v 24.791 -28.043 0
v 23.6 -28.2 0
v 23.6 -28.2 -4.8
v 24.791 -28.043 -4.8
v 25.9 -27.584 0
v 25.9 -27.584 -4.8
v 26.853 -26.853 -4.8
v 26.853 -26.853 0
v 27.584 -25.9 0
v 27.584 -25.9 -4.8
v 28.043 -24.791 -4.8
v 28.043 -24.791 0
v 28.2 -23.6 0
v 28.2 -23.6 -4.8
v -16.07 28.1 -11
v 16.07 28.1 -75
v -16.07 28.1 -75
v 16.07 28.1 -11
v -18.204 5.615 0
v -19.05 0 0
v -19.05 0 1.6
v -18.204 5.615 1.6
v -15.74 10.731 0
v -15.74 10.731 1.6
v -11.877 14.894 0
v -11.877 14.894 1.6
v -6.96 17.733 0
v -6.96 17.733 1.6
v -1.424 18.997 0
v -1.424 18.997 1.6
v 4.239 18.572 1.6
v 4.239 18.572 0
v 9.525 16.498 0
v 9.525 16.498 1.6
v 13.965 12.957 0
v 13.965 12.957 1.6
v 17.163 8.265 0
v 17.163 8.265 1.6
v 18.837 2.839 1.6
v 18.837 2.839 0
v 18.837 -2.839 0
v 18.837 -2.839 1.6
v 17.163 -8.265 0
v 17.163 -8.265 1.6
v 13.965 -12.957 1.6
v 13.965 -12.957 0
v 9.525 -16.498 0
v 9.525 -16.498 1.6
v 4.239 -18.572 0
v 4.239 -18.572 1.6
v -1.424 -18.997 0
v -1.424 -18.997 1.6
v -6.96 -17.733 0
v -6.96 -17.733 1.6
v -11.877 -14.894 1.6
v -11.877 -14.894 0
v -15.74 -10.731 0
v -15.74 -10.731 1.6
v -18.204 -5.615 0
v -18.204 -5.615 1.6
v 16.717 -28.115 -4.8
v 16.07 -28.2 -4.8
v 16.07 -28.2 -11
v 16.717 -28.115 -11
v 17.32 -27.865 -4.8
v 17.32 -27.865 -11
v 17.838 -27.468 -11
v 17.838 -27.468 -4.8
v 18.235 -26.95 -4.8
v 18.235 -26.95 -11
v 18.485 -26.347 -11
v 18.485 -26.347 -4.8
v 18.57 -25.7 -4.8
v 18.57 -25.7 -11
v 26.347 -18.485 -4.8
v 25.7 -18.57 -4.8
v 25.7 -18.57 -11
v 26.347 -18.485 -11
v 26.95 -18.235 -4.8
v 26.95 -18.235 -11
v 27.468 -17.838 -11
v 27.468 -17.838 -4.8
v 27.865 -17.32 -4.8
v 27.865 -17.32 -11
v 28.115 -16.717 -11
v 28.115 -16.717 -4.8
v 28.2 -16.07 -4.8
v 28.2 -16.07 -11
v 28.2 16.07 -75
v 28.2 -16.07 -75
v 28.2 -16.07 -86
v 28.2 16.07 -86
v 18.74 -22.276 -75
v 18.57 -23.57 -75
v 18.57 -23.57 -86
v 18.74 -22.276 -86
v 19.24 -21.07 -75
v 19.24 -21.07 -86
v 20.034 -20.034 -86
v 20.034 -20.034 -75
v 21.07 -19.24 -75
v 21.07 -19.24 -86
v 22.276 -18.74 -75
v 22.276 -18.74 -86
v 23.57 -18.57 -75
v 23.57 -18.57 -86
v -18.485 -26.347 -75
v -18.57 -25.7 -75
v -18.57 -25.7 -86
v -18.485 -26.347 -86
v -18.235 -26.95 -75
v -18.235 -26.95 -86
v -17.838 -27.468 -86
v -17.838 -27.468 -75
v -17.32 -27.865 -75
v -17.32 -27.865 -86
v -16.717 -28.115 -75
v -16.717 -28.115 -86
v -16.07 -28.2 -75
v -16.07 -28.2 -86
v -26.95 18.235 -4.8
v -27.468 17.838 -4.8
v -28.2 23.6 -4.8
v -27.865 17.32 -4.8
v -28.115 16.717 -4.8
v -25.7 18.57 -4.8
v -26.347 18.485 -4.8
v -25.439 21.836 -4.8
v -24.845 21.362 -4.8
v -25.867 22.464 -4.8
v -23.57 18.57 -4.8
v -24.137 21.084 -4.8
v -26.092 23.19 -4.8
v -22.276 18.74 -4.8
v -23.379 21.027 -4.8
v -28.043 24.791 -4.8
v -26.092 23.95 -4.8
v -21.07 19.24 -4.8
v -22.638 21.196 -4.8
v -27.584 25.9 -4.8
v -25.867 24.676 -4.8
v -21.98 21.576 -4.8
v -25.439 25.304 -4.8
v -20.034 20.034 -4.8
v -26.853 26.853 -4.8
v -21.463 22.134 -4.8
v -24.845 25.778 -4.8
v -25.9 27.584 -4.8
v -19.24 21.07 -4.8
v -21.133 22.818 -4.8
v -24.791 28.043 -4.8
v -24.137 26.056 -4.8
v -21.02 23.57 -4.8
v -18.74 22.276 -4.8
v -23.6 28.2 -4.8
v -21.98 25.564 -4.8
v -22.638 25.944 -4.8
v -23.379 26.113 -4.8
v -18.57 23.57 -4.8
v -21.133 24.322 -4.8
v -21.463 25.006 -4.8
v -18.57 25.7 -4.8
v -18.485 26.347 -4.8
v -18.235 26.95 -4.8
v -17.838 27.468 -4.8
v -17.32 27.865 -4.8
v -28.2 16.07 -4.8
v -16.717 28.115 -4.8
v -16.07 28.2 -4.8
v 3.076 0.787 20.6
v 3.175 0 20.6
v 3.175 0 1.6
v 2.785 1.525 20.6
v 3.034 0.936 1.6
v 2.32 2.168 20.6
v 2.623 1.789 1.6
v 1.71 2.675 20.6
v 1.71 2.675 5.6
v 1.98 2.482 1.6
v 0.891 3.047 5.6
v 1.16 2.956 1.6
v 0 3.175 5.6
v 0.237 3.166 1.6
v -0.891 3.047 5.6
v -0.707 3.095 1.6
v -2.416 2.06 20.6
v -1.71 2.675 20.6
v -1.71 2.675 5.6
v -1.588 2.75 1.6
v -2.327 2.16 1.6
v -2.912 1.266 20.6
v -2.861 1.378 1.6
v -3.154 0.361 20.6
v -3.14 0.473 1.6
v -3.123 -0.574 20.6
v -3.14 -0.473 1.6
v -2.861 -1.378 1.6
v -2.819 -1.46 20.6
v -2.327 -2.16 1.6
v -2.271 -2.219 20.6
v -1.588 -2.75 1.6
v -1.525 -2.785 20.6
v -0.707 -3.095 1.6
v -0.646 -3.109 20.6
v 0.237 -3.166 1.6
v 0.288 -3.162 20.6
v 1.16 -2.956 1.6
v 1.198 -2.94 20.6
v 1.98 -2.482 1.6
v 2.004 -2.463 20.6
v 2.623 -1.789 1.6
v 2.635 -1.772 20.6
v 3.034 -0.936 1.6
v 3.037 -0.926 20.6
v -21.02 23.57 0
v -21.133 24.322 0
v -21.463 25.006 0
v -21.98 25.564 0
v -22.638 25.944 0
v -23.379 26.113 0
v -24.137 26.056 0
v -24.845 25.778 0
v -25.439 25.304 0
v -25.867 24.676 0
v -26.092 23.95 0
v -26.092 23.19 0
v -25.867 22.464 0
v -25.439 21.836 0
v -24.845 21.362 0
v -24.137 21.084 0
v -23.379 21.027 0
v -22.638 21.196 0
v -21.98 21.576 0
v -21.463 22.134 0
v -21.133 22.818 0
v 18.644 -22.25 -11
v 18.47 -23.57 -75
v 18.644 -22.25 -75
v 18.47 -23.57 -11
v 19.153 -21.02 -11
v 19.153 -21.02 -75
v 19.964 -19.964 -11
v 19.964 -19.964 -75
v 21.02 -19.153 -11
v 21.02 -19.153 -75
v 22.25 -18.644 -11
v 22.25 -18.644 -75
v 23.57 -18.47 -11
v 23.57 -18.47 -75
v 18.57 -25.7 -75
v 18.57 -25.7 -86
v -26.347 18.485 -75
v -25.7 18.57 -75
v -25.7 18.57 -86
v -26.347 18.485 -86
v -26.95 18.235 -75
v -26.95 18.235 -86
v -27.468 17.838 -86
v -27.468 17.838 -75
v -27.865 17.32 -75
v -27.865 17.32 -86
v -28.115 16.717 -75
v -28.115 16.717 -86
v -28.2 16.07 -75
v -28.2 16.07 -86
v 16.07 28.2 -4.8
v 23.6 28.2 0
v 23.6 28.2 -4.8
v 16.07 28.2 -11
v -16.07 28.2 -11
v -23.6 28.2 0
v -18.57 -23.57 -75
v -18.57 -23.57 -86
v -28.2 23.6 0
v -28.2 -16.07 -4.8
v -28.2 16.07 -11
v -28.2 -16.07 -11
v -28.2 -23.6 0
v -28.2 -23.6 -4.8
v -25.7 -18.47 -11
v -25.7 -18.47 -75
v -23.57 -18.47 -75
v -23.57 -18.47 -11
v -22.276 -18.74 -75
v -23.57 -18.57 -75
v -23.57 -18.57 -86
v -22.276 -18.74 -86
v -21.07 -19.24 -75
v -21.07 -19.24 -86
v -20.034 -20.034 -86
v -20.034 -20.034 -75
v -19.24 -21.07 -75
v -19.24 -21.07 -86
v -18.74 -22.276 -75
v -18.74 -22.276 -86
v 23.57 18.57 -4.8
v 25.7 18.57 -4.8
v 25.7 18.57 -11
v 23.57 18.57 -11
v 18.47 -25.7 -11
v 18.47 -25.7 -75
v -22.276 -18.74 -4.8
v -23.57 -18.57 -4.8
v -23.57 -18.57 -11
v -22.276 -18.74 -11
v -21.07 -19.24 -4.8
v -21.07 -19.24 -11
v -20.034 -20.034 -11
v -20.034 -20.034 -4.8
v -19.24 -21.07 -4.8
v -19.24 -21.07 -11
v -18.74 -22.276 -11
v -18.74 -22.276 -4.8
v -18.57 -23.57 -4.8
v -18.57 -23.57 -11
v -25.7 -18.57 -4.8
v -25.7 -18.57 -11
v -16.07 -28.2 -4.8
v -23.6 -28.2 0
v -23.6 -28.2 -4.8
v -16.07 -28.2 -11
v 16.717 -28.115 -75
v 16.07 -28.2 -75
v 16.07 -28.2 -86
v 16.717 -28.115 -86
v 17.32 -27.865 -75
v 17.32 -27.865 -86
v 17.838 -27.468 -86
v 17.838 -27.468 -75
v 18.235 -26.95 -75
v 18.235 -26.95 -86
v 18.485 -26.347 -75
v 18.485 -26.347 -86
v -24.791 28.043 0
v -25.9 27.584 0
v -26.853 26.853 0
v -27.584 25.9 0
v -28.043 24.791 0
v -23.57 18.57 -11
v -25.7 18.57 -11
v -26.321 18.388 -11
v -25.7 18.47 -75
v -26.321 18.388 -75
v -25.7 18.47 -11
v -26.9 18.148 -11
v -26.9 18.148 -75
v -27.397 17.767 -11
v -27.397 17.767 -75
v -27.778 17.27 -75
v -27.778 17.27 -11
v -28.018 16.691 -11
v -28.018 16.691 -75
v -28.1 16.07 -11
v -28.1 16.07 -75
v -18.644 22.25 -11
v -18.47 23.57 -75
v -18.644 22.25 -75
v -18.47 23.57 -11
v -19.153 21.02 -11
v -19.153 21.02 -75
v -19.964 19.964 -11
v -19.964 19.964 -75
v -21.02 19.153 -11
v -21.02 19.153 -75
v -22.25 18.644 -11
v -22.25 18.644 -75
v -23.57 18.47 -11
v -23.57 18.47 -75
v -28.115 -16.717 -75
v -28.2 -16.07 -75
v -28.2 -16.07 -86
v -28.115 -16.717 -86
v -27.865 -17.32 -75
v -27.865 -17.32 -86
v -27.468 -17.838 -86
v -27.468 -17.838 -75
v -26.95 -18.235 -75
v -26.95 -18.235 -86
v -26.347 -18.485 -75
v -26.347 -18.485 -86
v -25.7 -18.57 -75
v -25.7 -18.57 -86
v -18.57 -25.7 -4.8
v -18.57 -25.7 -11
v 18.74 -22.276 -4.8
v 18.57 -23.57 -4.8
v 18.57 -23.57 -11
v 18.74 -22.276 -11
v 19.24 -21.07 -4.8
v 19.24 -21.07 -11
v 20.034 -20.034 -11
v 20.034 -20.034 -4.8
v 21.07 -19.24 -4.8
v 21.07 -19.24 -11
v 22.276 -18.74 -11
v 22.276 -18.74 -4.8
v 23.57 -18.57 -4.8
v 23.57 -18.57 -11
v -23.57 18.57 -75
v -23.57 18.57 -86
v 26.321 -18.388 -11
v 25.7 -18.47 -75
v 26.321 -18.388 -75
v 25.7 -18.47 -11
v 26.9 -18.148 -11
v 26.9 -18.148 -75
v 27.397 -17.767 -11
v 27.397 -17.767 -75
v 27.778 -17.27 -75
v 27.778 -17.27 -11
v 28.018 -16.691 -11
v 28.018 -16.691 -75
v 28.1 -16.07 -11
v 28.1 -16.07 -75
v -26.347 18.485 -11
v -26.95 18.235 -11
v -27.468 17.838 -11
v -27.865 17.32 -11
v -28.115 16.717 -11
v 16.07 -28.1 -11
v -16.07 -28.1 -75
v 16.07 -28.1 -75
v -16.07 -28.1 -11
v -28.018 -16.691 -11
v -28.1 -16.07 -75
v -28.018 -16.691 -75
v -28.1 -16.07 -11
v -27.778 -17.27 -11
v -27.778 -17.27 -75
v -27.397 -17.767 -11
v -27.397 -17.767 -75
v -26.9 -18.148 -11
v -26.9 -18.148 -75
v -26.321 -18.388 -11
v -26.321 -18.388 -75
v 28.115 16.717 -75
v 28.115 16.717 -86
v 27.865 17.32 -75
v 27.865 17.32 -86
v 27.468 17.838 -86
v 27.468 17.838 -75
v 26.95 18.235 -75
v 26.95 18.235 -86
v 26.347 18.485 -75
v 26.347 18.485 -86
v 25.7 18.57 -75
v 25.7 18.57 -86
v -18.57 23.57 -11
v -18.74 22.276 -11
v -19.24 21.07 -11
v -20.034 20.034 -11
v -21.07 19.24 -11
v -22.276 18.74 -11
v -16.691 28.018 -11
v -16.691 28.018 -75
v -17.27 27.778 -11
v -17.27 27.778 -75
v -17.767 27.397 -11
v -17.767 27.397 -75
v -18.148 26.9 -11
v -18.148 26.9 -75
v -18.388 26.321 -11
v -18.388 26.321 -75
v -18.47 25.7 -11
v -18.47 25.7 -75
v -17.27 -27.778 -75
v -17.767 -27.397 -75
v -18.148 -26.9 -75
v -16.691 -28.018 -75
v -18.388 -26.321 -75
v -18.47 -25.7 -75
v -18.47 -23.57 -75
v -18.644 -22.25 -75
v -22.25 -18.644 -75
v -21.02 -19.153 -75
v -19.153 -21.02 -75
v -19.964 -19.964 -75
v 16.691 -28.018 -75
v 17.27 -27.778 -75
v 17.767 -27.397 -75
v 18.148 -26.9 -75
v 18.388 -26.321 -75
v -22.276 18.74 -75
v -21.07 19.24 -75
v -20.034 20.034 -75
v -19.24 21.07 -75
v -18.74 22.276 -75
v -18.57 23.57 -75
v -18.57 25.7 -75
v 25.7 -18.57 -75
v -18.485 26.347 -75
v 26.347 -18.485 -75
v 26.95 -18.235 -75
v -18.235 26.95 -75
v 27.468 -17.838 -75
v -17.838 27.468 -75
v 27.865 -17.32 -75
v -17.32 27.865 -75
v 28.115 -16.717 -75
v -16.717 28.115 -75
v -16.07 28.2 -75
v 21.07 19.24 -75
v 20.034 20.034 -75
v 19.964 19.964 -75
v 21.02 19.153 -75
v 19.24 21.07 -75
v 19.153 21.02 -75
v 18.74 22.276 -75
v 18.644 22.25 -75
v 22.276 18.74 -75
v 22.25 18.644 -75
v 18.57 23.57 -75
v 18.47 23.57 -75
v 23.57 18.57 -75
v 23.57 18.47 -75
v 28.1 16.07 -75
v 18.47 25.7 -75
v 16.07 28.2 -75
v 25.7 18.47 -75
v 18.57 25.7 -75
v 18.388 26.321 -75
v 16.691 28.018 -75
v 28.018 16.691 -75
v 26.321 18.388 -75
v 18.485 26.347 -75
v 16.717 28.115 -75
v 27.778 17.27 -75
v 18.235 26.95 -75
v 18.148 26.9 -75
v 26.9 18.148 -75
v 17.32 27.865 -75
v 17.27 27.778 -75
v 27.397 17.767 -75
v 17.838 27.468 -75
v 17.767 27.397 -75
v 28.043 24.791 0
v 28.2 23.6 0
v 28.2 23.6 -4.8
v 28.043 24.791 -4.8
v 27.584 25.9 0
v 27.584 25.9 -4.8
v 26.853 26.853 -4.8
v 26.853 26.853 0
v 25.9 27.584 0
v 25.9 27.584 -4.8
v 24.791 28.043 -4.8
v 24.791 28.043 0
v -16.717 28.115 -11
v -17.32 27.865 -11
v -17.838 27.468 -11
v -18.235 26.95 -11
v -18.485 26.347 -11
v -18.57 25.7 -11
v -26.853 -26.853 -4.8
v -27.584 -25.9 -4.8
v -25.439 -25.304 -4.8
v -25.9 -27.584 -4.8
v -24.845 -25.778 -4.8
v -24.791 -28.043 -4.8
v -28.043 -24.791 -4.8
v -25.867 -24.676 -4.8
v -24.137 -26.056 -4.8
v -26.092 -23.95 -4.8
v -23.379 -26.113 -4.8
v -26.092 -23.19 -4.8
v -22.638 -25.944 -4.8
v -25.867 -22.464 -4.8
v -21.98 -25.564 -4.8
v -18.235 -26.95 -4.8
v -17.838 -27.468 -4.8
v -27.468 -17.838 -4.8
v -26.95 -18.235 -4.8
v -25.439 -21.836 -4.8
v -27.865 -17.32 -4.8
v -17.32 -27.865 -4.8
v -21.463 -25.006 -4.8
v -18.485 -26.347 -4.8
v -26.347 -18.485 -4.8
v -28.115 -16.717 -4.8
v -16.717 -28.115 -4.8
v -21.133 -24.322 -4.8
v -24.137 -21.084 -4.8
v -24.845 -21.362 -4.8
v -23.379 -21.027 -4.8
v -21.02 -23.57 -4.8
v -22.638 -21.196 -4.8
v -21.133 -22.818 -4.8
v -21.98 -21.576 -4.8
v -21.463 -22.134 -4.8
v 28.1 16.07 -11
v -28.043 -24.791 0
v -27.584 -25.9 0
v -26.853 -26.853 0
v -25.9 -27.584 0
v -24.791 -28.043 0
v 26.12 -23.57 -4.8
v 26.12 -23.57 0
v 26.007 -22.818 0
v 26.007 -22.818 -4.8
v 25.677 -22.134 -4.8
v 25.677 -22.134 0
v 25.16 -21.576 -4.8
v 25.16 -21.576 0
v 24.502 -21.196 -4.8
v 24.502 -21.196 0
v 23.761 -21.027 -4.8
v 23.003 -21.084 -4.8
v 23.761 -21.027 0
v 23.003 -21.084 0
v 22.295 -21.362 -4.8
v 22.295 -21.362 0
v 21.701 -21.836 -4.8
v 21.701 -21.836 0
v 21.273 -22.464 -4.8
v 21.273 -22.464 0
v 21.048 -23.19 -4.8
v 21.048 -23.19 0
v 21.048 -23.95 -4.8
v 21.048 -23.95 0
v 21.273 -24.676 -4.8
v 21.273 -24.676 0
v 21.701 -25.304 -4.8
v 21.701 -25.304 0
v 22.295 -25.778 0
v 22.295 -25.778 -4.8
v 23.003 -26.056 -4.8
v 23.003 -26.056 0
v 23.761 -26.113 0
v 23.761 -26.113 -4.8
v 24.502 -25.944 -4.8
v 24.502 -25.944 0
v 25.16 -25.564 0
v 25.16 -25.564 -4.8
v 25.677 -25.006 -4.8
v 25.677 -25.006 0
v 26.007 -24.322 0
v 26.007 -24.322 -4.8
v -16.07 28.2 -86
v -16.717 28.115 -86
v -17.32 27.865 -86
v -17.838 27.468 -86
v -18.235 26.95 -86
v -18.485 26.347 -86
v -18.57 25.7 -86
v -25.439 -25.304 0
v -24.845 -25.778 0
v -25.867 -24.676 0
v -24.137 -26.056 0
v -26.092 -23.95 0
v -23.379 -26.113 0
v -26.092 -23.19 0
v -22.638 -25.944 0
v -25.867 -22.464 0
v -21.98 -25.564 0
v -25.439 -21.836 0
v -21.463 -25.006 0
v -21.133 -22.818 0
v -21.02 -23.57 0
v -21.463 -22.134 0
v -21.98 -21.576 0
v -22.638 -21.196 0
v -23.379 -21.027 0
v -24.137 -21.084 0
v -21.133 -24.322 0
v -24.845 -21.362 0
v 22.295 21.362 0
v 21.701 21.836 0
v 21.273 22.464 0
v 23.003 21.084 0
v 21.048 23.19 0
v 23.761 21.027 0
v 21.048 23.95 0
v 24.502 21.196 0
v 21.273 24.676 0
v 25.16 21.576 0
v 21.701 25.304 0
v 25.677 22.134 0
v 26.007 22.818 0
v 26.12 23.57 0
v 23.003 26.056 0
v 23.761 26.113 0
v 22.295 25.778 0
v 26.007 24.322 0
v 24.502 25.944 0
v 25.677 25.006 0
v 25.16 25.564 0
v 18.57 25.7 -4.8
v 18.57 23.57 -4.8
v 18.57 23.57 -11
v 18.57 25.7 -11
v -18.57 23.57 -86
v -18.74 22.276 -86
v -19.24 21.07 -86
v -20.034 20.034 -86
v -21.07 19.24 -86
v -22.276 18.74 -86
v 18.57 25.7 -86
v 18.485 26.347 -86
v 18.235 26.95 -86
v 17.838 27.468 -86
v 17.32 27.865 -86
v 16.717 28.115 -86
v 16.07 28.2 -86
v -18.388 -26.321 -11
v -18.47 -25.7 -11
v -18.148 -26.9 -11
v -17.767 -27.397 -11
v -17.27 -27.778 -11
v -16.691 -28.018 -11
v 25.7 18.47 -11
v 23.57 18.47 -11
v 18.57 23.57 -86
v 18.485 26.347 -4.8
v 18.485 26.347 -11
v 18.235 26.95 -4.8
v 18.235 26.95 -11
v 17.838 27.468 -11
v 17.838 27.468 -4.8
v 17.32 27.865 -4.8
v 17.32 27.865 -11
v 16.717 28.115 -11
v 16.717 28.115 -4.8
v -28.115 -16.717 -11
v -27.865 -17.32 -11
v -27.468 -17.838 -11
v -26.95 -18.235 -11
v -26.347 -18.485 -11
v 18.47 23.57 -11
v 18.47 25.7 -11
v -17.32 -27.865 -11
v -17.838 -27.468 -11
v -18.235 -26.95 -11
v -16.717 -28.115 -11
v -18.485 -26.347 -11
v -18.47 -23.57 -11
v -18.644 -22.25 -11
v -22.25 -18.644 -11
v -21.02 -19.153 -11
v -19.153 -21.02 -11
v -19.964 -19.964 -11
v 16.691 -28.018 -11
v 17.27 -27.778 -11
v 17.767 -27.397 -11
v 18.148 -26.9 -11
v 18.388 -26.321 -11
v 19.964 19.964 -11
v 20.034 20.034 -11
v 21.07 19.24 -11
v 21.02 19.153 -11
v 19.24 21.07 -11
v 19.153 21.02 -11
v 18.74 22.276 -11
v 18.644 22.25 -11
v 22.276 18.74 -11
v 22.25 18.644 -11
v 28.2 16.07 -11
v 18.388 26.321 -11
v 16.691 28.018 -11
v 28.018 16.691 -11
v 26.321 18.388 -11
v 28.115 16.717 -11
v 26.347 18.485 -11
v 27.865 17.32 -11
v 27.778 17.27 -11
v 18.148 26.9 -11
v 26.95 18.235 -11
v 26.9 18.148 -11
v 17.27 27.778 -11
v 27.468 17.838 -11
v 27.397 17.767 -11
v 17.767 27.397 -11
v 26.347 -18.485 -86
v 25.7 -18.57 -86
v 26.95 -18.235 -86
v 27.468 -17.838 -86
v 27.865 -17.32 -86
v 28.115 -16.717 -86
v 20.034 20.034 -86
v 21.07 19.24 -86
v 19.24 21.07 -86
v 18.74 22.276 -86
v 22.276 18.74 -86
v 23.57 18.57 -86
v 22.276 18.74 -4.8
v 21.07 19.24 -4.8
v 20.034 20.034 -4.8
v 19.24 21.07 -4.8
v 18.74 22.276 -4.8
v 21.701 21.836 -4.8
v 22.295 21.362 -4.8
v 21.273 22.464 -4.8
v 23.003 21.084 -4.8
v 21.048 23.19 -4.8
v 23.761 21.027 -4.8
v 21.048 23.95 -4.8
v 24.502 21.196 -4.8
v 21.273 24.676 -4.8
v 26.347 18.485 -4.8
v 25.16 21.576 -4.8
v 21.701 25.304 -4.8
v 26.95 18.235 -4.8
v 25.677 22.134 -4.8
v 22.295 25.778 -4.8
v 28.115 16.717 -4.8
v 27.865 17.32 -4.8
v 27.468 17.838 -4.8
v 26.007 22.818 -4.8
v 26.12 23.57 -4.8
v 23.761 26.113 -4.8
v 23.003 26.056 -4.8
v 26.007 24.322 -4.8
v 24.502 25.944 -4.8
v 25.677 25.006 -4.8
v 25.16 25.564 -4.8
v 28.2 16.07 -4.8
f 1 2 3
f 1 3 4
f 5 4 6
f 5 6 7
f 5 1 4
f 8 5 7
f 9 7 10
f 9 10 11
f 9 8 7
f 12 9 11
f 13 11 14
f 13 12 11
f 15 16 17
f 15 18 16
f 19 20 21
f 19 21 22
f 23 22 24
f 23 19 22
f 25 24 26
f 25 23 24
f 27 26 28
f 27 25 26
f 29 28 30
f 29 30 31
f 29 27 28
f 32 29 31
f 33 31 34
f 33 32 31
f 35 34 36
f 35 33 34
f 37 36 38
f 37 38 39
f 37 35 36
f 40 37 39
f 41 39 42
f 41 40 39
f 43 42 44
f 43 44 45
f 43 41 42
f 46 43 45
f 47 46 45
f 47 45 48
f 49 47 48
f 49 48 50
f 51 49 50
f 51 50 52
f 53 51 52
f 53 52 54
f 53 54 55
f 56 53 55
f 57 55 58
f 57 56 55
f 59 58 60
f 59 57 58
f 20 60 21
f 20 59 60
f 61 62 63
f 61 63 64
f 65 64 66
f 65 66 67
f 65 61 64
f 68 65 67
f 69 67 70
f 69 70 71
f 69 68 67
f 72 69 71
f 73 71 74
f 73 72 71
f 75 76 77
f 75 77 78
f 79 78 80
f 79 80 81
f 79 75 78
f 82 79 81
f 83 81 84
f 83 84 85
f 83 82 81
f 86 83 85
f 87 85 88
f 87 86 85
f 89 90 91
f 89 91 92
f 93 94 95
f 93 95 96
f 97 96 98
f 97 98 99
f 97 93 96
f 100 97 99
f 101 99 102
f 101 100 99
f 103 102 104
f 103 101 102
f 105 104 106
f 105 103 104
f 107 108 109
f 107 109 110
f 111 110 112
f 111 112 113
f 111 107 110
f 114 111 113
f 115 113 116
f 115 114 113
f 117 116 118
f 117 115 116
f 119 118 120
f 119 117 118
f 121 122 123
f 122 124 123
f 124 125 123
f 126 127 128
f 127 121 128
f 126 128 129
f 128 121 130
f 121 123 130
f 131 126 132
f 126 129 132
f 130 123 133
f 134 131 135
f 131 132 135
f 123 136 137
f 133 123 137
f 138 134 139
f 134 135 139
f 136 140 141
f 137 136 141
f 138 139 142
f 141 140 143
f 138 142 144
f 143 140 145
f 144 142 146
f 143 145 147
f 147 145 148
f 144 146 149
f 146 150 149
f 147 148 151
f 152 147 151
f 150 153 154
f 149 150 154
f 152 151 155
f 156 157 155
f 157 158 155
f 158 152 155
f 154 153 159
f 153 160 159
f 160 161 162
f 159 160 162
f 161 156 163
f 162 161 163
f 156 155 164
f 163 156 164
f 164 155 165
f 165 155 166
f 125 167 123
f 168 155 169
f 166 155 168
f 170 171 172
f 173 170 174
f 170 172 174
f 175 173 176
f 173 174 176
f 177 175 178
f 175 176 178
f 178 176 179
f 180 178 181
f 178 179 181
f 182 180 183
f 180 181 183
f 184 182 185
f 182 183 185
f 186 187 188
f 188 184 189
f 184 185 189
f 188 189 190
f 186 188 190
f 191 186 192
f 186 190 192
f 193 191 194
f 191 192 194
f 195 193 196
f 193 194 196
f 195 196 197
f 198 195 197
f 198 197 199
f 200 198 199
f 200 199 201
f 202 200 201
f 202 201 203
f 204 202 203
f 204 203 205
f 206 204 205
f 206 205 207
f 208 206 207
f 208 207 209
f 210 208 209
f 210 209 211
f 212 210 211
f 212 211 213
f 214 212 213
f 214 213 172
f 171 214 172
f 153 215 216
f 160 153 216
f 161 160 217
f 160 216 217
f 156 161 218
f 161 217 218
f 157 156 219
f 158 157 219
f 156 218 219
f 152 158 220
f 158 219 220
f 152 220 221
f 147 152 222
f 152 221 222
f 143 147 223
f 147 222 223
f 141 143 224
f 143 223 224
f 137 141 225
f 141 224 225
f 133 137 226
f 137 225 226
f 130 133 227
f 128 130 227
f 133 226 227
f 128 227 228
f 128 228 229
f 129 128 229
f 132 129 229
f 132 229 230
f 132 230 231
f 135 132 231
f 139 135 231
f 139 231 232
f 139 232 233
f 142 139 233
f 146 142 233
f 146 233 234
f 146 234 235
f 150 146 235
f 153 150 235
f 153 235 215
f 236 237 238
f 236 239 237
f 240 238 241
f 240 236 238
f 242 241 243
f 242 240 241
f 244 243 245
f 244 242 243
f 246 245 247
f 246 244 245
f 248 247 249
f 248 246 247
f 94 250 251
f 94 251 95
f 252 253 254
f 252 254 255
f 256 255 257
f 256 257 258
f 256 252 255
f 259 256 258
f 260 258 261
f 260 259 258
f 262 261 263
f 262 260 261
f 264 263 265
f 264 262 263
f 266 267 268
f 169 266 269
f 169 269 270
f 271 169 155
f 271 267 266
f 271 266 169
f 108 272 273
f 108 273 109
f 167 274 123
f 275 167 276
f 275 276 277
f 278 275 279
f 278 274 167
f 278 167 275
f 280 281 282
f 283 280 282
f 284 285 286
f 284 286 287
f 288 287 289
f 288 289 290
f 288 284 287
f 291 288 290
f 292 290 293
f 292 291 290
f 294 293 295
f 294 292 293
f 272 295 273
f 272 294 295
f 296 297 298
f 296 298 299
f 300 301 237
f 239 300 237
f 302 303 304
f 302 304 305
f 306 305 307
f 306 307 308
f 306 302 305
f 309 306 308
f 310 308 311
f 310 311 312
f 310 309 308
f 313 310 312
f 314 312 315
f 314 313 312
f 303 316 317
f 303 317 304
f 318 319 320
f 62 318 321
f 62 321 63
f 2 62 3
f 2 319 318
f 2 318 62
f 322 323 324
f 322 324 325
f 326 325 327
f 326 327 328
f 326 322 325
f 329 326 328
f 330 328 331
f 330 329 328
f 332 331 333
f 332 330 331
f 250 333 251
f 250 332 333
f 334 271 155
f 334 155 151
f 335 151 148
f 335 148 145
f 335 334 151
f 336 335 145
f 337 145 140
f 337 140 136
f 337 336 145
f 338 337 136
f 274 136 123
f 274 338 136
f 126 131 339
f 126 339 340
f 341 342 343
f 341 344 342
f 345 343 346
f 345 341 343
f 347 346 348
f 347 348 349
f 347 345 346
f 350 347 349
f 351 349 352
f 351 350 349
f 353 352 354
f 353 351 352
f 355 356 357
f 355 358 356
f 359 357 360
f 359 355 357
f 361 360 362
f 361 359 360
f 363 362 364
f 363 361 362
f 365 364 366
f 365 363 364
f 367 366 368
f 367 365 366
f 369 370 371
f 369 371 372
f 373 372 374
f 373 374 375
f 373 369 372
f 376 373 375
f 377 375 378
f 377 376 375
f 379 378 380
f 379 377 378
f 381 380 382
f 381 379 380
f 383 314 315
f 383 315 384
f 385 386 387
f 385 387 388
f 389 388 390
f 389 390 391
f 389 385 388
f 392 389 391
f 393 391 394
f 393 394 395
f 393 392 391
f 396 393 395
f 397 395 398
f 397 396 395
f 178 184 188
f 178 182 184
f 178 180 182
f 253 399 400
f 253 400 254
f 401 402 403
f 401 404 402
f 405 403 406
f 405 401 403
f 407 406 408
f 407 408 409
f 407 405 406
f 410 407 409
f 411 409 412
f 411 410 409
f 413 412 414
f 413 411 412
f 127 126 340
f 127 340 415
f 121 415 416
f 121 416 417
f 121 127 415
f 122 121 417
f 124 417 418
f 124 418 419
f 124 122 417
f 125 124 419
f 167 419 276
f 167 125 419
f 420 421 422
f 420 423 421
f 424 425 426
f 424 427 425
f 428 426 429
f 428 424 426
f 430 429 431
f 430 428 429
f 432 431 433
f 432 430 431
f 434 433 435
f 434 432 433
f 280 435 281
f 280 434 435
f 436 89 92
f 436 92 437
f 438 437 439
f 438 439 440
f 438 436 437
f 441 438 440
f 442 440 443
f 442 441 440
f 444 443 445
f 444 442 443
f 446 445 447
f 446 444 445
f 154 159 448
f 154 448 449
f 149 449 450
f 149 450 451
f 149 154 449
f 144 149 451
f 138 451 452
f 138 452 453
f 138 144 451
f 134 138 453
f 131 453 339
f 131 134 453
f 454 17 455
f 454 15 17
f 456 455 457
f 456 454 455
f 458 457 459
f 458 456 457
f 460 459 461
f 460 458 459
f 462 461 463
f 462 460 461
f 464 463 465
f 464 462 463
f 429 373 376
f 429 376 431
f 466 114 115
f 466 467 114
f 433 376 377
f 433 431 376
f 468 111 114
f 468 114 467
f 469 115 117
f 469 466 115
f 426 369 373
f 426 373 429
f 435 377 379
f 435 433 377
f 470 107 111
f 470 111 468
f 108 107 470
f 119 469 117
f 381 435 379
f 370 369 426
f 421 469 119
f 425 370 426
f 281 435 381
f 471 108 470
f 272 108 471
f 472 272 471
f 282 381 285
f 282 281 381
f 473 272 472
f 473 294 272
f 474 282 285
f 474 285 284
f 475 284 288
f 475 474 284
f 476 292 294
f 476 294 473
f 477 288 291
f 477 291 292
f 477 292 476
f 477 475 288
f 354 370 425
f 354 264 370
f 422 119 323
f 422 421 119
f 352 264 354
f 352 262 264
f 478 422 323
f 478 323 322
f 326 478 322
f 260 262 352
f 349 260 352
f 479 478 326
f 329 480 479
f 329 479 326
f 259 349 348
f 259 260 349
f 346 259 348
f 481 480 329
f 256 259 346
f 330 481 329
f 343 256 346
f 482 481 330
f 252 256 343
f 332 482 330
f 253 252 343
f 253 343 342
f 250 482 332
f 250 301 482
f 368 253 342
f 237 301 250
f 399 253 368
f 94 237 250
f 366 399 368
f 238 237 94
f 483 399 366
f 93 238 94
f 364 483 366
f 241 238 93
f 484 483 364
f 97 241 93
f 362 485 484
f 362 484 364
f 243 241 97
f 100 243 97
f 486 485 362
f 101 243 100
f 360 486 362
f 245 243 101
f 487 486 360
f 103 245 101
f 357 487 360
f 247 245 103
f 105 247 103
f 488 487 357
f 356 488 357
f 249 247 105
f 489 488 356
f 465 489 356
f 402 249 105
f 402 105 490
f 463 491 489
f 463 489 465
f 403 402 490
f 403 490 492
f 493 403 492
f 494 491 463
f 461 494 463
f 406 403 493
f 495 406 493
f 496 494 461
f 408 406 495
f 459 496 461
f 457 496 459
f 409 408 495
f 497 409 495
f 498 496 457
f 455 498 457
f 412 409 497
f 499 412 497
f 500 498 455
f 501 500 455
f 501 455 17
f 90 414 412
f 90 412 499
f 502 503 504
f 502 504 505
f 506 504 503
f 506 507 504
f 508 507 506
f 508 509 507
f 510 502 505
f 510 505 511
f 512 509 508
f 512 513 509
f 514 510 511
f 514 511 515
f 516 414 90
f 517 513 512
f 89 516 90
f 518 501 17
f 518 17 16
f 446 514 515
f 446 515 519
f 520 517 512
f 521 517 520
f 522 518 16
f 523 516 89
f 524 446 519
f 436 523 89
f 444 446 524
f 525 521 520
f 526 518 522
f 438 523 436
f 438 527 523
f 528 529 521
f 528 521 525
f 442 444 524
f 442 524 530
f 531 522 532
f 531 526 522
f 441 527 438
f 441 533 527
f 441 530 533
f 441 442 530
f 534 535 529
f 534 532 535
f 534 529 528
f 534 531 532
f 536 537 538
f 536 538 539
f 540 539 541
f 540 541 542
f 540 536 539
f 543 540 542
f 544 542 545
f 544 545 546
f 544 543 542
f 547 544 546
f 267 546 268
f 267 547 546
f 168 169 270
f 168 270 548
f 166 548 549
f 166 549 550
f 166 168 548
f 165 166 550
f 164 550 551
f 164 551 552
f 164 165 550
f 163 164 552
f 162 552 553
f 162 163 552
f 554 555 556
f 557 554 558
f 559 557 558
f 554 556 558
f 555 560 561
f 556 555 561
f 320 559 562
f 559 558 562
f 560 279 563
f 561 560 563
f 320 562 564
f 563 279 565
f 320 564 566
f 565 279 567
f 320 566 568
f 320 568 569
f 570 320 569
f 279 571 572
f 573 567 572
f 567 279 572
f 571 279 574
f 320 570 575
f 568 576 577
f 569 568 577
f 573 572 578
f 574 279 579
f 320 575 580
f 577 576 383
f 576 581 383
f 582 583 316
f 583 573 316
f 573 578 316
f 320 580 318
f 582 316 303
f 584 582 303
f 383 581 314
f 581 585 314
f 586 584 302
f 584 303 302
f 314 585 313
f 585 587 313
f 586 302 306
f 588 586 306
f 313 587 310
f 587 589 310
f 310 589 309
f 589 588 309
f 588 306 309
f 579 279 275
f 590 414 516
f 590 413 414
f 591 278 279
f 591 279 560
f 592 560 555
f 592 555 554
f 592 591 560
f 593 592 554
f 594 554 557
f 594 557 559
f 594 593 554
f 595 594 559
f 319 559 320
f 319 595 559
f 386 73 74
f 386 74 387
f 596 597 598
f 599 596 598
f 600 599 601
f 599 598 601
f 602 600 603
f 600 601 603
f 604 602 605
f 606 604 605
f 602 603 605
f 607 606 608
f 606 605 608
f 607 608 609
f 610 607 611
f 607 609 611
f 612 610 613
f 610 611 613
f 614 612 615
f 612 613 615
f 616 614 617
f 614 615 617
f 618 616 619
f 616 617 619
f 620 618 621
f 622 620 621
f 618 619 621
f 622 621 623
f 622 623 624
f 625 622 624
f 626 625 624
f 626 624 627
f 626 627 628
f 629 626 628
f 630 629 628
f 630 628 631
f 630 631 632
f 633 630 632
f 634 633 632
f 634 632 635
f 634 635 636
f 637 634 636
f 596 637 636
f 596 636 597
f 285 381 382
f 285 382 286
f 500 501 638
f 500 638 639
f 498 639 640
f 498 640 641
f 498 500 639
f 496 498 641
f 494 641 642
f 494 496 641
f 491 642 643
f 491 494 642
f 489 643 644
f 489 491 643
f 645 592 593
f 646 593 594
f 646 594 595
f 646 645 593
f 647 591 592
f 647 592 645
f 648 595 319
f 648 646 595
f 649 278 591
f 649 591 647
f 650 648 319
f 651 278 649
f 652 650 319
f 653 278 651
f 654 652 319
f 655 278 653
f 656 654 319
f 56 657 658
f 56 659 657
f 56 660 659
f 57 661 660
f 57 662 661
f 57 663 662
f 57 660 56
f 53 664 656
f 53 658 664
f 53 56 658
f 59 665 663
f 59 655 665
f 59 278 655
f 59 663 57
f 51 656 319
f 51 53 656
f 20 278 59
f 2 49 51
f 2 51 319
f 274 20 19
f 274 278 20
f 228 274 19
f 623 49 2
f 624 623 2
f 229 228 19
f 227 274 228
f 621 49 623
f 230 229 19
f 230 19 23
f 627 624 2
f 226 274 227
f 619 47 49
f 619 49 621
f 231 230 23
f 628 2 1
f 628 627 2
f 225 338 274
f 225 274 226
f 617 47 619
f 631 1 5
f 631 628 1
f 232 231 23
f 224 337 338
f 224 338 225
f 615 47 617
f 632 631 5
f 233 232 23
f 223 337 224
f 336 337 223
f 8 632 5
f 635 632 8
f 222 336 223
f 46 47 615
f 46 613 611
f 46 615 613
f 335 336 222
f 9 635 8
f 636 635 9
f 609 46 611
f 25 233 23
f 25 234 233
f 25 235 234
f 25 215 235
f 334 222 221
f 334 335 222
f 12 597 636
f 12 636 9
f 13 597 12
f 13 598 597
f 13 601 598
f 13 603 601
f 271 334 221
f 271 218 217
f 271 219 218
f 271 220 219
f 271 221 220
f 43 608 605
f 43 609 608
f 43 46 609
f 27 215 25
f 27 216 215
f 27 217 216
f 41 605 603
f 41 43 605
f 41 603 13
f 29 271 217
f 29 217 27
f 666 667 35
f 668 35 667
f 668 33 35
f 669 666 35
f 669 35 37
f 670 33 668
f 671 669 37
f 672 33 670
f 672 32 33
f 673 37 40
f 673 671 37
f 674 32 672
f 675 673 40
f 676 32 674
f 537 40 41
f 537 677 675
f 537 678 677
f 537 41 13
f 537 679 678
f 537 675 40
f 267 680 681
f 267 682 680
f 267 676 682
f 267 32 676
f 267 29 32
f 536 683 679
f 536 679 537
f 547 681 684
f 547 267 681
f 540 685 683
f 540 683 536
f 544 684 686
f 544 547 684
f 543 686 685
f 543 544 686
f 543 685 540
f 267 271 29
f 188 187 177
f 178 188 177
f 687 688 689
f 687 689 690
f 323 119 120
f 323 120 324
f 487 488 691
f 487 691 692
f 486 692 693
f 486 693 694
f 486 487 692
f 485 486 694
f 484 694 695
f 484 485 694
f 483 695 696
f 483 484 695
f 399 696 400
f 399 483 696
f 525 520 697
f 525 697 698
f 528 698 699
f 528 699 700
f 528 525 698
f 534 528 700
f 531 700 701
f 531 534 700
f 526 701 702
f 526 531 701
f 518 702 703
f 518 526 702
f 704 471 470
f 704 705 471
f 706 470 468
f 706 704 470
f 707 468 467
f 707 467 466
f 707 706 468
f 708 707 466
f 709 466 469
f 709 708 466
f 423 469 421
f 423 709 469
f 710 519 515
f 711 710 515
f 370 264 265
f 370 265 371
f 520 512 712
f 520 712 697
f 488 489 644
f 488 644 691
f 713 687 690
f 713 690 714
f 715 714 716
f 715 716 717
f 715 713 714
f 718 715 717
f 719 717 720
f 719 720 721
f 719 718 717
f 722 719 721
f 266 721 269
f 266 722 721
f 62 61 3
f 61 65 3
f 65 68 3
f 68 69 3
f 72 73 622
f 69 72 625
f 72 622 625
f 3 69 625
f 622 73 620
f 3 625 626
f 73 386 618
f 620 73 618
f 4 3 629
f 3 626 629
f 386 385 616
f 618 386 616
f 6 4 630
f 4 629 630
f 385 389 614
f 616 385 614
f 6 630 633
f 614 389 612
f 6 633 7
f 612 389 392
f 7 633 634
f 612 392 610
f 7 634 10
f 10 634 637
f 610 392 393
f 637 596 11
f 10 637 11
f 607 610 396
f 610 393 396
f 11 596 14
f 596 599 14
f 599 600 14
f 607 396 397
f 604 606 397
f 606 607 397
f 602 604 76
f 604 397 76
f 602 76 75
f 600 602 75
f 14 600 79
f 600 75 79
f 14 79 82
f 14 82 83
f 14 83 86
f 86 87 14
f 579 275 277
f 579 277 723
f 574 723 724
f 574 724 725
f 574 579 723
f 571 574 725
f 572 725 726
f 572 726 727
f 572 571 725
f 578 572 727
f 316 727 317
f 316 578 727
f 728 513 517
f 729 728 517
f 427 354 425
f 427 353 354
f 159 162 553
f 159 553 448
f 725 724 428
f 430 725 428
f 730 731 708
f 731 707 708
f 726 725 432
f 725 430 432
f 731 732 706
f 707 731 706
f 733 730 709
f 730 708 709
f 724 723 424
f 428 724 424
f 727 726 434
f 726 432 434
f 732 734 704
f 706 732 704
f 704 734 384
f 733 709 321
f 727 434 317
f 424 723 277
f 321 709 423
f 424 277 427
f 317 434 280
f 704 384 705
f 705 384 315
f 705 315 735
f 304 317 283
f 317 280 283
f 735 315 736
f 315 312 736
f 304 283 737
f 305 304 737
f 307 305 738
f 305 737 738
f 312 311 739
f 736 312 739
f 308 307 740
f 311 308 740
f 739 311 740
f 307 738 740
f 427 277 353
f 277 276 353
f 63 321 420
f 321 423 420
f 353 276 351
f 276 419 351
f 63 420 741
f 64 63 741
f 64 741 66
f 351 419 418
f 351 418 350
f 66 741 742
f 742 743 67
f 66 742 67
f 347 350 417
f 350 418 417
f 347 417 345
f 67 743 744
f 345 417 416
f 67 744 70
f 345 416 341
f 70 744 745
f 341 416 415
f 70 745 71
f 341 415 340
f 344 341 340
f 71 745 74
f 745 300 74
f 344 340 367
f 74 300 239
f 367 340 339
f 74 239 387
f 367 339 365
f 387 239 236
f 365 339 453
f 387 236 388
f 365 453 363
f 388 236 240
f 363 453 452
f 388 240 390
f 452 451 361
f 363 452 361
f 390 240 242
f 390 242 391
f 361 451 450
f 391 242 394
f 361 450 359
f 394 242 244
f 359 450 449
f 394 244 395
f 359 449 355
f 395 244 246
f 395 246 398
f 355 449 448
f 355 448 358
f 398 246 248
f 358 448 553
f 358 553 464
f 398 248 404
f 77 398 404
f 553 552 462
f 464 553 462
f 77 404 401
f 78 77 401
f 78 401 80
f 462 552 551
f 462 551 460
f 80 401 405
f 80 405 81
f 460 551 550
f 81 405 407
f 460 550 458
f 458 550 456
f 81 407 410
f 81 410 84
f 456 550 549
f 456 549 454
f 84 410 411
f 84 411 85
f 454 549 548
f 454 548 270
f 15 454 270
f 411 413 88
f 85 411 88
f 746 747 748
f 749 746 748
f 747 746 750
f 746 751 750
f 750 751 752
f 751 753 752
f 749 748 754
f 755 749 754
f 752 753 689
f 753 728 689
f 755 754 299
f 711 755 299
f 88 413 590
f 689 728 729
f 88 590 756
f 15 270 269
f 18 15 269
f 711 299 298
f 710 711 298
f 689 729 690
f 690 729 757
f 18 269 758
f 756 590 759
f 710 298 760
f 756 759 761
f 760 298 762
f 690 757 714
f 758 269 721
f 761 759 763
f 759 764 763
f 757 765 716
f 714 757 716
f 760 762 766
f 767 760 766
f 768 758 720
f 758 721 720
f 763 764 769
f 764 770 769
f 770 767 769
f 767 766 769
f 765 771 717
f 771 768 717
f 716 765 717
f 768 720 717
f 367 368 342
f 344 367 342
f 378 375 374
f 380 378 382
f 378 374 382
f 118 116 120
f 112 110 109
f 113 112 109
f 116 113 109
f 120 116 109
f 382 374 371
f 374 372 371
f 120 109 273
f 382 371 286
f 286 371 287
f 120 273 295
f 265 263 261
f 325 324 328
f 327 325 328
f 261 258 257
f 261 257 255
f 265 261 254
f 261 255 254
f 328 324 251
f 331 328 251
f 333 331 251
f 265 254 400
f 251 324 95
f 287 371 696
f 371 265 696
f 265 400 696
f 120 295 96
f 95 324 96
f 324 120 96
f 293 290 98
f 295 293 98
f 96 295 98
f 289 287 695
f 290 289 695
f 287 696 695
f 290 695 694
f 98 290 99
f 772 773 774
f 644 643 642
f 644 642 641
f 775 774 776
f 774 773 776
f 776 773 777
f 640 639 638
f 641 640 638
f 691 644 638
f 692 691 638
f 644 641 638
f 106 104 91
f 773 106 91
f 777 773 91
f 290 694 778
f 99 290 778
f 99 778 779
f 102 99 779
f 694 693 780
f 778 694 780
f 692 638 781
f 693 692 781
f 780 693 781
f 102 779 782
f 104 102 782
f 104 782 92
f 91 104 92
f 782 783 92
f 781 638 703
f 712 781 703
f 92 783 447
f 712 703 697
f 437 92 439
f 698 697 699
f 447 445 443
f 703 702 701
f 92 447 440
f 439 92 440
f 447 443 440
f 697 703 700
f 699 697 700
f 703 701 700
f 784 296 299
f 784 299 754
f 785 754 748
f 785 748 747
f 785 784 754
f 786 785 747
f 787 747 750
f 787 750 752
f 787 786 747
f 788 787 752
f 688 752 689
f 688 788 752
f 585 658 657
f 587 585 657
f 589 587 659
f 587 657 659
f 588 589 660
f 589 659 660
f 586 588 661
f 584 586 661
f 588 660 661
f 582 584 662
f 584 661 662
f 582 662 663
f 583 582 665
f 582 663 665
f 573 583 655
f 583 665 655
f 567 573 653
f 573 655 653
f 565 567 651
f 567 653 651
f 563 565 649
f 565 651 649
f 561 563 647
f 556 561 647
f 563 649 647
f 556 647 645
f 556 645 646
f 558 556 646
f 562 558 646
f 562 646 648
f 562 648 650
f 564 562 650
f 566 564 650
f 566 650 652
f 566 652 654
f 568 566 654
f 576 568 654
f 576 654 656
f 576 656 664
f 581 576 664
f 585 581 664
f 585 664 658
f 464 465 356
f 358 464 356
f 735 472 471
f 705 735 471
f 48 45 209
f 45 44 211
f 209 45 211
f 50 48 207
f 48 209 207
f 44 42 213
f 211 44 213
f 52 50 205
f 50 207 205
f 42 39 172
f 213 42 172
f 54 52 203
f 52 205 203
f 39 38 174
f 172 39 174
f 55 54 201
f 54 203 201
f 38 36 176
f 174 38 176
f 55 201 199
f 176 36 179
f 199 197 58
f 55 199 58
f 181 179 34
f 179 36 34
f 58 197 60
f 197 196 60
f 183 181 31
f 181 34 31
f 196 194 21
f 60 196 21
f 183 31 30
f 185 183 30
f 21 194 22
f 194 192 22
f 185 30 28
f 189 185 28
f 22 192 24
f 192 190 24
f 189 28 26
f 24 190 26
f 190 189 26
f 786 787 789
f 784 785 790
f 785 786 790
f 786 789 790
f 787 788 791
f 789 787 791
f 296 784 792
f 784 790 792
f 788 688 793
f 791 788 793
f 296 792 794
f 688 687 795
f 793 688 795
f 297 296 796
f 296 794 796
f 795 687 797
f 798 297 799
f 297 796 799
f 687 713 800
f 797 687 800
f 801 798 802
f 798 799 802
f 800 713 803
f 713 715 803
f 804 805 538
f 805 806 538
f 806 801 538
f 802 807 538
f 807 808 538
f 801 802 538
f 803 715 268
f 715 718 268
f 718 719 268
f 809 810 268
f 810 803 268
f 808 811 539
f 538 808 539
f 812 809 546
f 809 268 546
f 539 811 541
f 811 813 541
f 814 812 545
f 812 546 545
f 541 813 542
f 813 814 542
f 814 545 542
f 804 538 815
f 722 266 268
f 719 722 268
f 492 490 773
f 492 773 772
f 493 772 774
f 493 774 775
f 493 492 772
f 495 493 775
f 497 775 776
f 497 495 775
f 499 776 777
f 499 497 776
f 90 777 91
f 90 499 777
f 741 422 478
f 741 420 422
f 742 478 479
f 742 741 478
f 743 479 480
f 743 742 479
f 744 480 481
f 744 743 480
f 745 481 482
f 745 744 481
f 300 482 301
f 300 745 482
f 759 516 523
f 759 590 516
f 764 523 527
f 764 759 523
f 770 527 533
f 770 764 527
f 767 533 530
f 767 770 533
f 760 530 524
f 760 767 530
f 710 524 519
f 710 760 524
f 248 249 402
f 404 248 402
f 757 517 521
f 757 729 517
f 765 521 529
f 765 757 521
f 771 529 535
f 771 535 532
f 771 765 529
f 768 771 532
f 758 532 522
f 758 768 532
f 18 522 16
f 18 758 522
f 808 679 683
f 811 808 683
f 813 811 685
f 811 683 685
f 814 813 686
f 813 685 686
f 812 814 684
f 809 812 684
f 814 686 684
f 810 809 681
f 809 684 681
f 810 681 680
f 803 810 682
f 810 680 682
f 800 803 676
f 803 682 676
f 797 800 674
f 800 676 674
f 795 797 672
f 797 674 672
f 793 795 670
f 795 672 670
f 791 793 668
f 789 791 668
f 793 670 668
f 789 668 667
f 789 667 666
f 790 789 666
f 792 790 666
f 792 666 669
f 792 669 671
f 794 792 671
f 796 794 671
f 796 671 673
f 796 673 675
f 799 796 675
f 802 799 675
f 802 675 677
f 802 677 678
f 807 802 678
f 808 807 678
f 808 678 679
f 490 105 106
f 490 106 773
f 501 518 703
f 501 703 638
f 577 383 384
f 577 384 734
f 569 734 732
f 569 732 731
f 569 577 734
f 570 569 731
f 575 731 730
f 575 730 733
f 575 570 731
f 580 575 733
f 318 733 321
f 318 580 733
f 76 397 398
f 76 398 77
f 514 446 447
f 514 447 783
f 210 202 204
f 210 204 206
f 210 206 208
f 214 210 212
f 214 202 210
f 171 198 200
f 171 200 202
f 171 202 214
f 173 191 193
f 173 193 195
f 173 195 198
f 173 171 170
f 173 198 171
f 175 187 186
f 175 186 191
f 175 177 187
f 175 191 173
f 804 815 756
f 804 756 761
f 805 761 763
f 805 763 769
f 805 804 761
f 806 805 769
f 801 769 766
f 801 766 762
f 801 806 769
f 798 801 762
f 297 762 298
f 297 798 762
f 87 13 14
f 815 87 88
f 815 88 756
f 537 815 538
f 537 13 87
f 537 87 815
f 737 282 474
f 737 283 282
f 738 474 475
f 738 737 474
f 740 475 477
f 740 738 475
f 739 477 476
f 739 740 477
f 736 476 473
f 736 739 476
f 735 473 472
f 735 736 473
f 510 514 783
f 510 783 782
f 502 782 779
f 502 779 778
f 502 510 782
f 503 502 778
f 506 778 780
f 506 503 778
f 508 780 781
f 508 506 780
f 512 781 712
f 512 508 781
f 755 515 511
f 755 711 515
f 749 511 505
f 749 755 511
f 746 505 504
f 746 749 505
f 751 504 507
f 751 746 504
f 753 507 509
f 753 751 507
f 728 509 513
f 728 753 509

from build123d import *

# Parameters (mm, degrees)
SKETCH1_R           = 3.175
BOSS_EXTRUDE1_DEPTH = 20.6
SKETCH2_R           = 19.05
BOSS_EXTRUDE2_DEPTH = 1.6
BOSS_EXTRUDE3_DEPTH = 4.8
BOSS_EXTRUDE4_DEPTH = 81.2
SKETCH7_W           = 3.420526276
SKETCH7_H           = 1.112659396
CUT_EXTRUDE5_DEPTH  = 15
CUT_EXTRUDE6_REACH  = 88
SKETCH8_R           = 2.55
CUT_EXTRUDE7_DEPTH  = 32


with BuildPart() as part:
    # Sketch1 → Boss-Extrude1 (new body)
    with BuildSketch(Plane.XY):
        Circle(SKETCH1_R)
    extrude(amount=BOSS_EXTRUDE1_DEPTH)

    # Sketch2 → Boss-Extrude2 (add)
    with BuildSketch(Plane(origin=(0, 0, 0), x_dir=(-1, 0, 0), z_dir=(0, 0, -1))):
        Circle(SKETCH2_R)
    extrude(amount=-BOSS_EXTRUDE2_DEPTH)

    # Sketch3 → Boss-Extrude3 (add)
    with BuildSketch(Plane(origin=(0, 0, 0), x_dir=(-1, 0, 0), z_dir=(0, 0, -1))):
        with BuildLine():
            Line((23.6, -28.2), (-23.6, -28.2))
            ThreePointArc((-23.6, -28.2), (-26.852691193, -26.852691193), (-28.2, -23.6))
            Line((-28.2, -23.6), (-28.2, 23.6))
            ThreePointArc((-28.2, 23.6), (-26.852691193, 26.852691193), (-23.6, 28.2))
            Line((-23.6, 28.2), (23.6, 28.2))
            ThreePointArc((23.6, 28.2), (26.852691193, 26.852691193), (28.2, 23.6))
            Line((28.2, 23.6), (28.2, -23.6))
            ThreePointArc((28.2, -23.6), (26.852691193, -26.852691193), (23.6, -28.2))
        make_face()
    extrude(amount=BOSS_EXTRUDE3_DEPTH)

    # Sketch4 → Boss-Extrude4 (add)
    with BuildSketch(Plane(origin=(0, 0, -4.8), x_dir=(-1, 0, 0), z_dir=(0, 0, -1))):
        with BuildLine():
            Line((-18.57, 23.57), (-18.57, 25.7))
            ThreePointArc((-18.57, 25.7), (-17.837766953, 27.467766953), (-16.07, 28.2))
            Line((-16.07, 28.2), (16.07, 28.2))
            ThreePointArc((16.07, 28.2), (17.837766953, 27.467766953), (18.57, 25.7))
            Line((18.57, 25.7), (18.57, 23.57))
            ThreePointArc((18.57, 23.57), (20.034466094, 20.034466094), (23.57, 18.57))
            Line((23.57, 18.57), (25.7, 18.57))
            ThreePointArc((25.7, 18.57), (27.467766953, 17.837766953), (28.2, 16.07))
            Line((28.2, 16.07), (28.2, -16.07))
            ThreePointArc((28.2, -16.07), (27.467766953, -17.837766953), (25.7, -18.57))
            Line((25.7, -18.57), (23.57, -18.57))
            ThreePointArc((23.57, -18.57), (20.034466094, -20.034466094), (18.57, -23.57))
            Line((18.57, -23.57), (18.57, -25.7))
            ThreePointArc((18.57, -25.7), (17.837766953, -27.467766953), (16.07, -28.2))
            Line((16.07, -28.2), (-16.07, -28.2))
            ThreePointArc((-16.07, -28.2), (-17.837766953, -27.467766953), (-18.57, -25.7))
            Line((-18.57, -25.7), (-18.57, -23.57))
            ThreePointArc((-18.57, -23.57), (-20.034466094, -20.034466094), (-23.57, -18.57))
            Line((-23.57, -18.57), (-25.7, -18.57))
            ThreePointArc((-25.7, -18.57), (-27.467766953, -17.837766953), (-28.2, -16.07))
            Line((-28.2, -16.07), (-28.2, 16.07))
            ThreePointArc((-28.2, 16.07), (-27.467766953, 17.837766953), (-25.7, 18.57))
            Line((-25.7, 18.57), (-23.57, 18.57))
            ThreePointArc((-23.57, 18.57), (-20.034466094, 20.034466094), (-18.57, 23.57))
        make_face()
    extrude(amount=BOSS_EXTRUDE4_DEPTH)

    # Sketch7 → Cut-Extrude5 (cut)
    with BuildSketch(Plane.XY.offset(20.6)):
        with Locations((0, 3.231329698)):
            Rectangle(SKETCH7_W, SKETCH7_H)
    extrude(amount=-CUT_EXTRUDE5_DEPTH, mode=Mode.SUBTRACT)

    # Sketch8 → Cut-Extrude6 (cut, up to next)
    with BuildSketch(Plane.XY, mode=Mode.PRIVATE) as cut_extrude6_sk1:
        with Locations((-23.57, 23.57)):
            Circle(SKETCH8_R)
    cut_extrude6_tool1 = extrude(cut_extrude6_sk1.sketch, amount=-CUT_EXTRUDE6_REACH, mode=Mode.PRIVATE) & part.part
    add(cut_extrude6_tool1.solids().sort_by_distance((-23.57, 23.57, 0))[0], mode=Mode.SUBTRACT)
    # Sketch8 → Cut-Extrude6 (cut, up to next)
    with BuildSketch(Plane.XY, mode=Mode.PRIVATE) as cut_extrude6_sk2:
        with Locations((23.57, 23.57)):
            Circle(SKETCH8_R)
    cut_extrude6_tool2 = extrude(cut_extrude6_sk2.sketch, amount=-CUT_EXTRUDE6_REACH, mode=Mode.PRIVATE) & part.part
    add(cut_extrude6_tool2.solids().sort_by_distance((23.57, 23.57, 0))[0], mode=Mode.SUBTRACT)
    # Sketch8 → Cut-Extrude6 (cut, up to next)
    with BuildSketch(Plane.XY, mode=Mode.PRIVATE) as cut_extrude6_sk3:
        with Locations((23.57, -23.57)):
            Circle(SKETCH8_R)
    cut_extrude6_tool3 = extrude(cut_extrude6_sk3.sketch, amount=-CUT_EXTRUDE6_REACH, mode=Mode.PRIVATE) & part.part
    add(cut_extrude6_tool3.solids().sort_by_distance((23.57, -23.57, 0))[0], mode=Mode.SUBTRACT)
    # Sketch8 → Cut-Extrude6 (cut, up to next)
    with BuildSketch(Plane.XY, mode=Mode.PRIVATE) as cut_extrude6_sk4:
        with Locations((-23.57, -23.57)):
            Circle(SKETCH8_R)
    cut_extrude6_tool4 = extrude(cut_extrude6_sk4.sketch, amount=-CUT_EXTRUDE6_REACH, mode=Mode.PRIVATE) & part.part
    add(cut_extrude6_tool4.solids().sort_by_distance((-23.57, -23.57, 0))[0], mode=Mode.SUBTRACT)

    # Sketch9 → Cut-Extrude7 (cut, symmetric)
    with BuildSketch(Plane.XY.offset(-43)):
        with BuildLine():
            Line((18.57, 23.57), (18.57, 25.7))
            ThreePointArc((18.57, 25.7), (17.837766953, 27.467766953), (16.07, 28.2))
            Line((16.07, 28.2), (-16.07, 28.2))
            ThreePointArc((-16.07, 28.2), (-17.837766953, 27.467766953), (-18.57, 25.7))
            Line((-18.57, 25.7), (-18.57, 23.57))
            ThreePointArc((-18.57, 23.57), (-20.034466094, 20.034466094), (-23.57, 18.57))
            Line((-23.57, 18.57), (-25.7, 18.57))
            ThreePointArc((-25.7, 18.57), (-27.467766953, 17.837766953), (-28.2, 16.07))
            Line((-28.2, 16.07), (-28.2, -16.07))
            ThreePointArc((-28.2, -16.07), (-27.467766953, -17.837766953), (-25.7, -18.57))
            Line((-25.7, -18.57), (-23.57, -18.57))
            ThreePointArc((-23.57, -18.57), (-20.034466094, -20.034466094), (-18.57, -23.57))
            Line((-18.57, -23.57), (-18.57, -25.7))
            ThreePointArc((-18.57, -25.7), (-17.837766953, -27.467766953), (-16.07, -28.2))
            Line((-16.07, -28.2), (16.07, -28.2))
            ThreePointArc((16.07, -28.2), (17.837766953, -27.467766953), (18.57, -25.7))
            Line((18.57, -25.7), (18.57, -23.57))
            ThreePointArc((18.57, -23.57), (20.034466094, -20.034466094), (23.57, -18.57))
            Line((23.57, -18.57), (25.7, -18.57))
            ThreePointArc((25.7, -18.57), (27.467766953, -17.837766953), (28.2, -16.07))
            Line((28.2, -16.07), (28.2, 16.07))
            ThreePointArc((28.2, 16.07), (27.467766953, 17.837766953), (25.7, 18.57))
            Line((25.7, 18.57), (23.57, 18.57))
            ThreePointArc((23.57, 18.57), (20.034466094, 20.034466094), (18.57, 23.57))
        make_face()
        with BuildLine():
            Line((18.47, 23.57), (18.47, 25.7))
            ThreePointArc((18.47, 25.7), (17.767056275, 27.397056275), (16.07, 28.1))
            Line((16.07, 28.1), (-16.07, 28.1))
            ThreePointArc((-16.07, 28.1), (-17.767056275, 27.397056275), (-18.47, 25.7))
            Line((-18.47, 25.7), (-18.47, 23.57))
            ThreePointArc((-18.47, 23.57), (-19.963755416, 19.963755416), (-23.57, 18.47))
            Line((-23.57, 18.47), (-25.7, 18.47))
            ThreePointArc((-25.7, 18.47), (-27.397056275, 17.767056275), (-28.1, 16.07))
            Line((-28.1, 16.07), (-28.1, -16.07))
            ThreePointArc((-28.1, -16.07), (-27.397056275, -17.767056275), (-25.7, -18.47))
            Line((-25.7, -18.47), (-23.57, -18.47))
            ThreePointArc((-23.57, -18.47), (-19.963755416, -19.963755416), (-18.47, -23.57))
            Line((-18.47, -23.57), (-18.47, -25.7))
            ThreePointArc((-18.47, -25.7), (-17.767056275, -27.397056275), (-16.07, -28.1))
            Line((-16.07, -28.1), (16.07, -28.1))
            ThreePointArc((16.07, -28.1), (17.767056275, -27.397056275), (18.47, -25.7))
            Line((18.47, -25.7), (18.47, -23.57))
            ThreePointArc((18.47, -23.57), (19.963755416, -19.963755416), (23.57, -18.47))
            Line((23.57, -18.47), (25.7, -18.47))
            ThreePointArc((25.7, -18.47), (27.397056275, -17.767056275), (28.1, -16.07))
            Line((28.1, -16.07), (28.1, 16.07))
            ThreePointArc((28.1, 16.07), (27.397056275, 17.767056275), (25.7, 18.47))
            Line((25.7, 18.47), (23.57, 18.47))
            ThreePointArc((23.57, 18.47), (19.963755416, 19.963755416), (18.47, 23.57))
        make_face(mode=Mode.SUBTRACT)
    extrude(amount=CUT_EXTRUDE7_DEPTH, both=True, mode=Mode.SUBTRACT)


solid = part.part
